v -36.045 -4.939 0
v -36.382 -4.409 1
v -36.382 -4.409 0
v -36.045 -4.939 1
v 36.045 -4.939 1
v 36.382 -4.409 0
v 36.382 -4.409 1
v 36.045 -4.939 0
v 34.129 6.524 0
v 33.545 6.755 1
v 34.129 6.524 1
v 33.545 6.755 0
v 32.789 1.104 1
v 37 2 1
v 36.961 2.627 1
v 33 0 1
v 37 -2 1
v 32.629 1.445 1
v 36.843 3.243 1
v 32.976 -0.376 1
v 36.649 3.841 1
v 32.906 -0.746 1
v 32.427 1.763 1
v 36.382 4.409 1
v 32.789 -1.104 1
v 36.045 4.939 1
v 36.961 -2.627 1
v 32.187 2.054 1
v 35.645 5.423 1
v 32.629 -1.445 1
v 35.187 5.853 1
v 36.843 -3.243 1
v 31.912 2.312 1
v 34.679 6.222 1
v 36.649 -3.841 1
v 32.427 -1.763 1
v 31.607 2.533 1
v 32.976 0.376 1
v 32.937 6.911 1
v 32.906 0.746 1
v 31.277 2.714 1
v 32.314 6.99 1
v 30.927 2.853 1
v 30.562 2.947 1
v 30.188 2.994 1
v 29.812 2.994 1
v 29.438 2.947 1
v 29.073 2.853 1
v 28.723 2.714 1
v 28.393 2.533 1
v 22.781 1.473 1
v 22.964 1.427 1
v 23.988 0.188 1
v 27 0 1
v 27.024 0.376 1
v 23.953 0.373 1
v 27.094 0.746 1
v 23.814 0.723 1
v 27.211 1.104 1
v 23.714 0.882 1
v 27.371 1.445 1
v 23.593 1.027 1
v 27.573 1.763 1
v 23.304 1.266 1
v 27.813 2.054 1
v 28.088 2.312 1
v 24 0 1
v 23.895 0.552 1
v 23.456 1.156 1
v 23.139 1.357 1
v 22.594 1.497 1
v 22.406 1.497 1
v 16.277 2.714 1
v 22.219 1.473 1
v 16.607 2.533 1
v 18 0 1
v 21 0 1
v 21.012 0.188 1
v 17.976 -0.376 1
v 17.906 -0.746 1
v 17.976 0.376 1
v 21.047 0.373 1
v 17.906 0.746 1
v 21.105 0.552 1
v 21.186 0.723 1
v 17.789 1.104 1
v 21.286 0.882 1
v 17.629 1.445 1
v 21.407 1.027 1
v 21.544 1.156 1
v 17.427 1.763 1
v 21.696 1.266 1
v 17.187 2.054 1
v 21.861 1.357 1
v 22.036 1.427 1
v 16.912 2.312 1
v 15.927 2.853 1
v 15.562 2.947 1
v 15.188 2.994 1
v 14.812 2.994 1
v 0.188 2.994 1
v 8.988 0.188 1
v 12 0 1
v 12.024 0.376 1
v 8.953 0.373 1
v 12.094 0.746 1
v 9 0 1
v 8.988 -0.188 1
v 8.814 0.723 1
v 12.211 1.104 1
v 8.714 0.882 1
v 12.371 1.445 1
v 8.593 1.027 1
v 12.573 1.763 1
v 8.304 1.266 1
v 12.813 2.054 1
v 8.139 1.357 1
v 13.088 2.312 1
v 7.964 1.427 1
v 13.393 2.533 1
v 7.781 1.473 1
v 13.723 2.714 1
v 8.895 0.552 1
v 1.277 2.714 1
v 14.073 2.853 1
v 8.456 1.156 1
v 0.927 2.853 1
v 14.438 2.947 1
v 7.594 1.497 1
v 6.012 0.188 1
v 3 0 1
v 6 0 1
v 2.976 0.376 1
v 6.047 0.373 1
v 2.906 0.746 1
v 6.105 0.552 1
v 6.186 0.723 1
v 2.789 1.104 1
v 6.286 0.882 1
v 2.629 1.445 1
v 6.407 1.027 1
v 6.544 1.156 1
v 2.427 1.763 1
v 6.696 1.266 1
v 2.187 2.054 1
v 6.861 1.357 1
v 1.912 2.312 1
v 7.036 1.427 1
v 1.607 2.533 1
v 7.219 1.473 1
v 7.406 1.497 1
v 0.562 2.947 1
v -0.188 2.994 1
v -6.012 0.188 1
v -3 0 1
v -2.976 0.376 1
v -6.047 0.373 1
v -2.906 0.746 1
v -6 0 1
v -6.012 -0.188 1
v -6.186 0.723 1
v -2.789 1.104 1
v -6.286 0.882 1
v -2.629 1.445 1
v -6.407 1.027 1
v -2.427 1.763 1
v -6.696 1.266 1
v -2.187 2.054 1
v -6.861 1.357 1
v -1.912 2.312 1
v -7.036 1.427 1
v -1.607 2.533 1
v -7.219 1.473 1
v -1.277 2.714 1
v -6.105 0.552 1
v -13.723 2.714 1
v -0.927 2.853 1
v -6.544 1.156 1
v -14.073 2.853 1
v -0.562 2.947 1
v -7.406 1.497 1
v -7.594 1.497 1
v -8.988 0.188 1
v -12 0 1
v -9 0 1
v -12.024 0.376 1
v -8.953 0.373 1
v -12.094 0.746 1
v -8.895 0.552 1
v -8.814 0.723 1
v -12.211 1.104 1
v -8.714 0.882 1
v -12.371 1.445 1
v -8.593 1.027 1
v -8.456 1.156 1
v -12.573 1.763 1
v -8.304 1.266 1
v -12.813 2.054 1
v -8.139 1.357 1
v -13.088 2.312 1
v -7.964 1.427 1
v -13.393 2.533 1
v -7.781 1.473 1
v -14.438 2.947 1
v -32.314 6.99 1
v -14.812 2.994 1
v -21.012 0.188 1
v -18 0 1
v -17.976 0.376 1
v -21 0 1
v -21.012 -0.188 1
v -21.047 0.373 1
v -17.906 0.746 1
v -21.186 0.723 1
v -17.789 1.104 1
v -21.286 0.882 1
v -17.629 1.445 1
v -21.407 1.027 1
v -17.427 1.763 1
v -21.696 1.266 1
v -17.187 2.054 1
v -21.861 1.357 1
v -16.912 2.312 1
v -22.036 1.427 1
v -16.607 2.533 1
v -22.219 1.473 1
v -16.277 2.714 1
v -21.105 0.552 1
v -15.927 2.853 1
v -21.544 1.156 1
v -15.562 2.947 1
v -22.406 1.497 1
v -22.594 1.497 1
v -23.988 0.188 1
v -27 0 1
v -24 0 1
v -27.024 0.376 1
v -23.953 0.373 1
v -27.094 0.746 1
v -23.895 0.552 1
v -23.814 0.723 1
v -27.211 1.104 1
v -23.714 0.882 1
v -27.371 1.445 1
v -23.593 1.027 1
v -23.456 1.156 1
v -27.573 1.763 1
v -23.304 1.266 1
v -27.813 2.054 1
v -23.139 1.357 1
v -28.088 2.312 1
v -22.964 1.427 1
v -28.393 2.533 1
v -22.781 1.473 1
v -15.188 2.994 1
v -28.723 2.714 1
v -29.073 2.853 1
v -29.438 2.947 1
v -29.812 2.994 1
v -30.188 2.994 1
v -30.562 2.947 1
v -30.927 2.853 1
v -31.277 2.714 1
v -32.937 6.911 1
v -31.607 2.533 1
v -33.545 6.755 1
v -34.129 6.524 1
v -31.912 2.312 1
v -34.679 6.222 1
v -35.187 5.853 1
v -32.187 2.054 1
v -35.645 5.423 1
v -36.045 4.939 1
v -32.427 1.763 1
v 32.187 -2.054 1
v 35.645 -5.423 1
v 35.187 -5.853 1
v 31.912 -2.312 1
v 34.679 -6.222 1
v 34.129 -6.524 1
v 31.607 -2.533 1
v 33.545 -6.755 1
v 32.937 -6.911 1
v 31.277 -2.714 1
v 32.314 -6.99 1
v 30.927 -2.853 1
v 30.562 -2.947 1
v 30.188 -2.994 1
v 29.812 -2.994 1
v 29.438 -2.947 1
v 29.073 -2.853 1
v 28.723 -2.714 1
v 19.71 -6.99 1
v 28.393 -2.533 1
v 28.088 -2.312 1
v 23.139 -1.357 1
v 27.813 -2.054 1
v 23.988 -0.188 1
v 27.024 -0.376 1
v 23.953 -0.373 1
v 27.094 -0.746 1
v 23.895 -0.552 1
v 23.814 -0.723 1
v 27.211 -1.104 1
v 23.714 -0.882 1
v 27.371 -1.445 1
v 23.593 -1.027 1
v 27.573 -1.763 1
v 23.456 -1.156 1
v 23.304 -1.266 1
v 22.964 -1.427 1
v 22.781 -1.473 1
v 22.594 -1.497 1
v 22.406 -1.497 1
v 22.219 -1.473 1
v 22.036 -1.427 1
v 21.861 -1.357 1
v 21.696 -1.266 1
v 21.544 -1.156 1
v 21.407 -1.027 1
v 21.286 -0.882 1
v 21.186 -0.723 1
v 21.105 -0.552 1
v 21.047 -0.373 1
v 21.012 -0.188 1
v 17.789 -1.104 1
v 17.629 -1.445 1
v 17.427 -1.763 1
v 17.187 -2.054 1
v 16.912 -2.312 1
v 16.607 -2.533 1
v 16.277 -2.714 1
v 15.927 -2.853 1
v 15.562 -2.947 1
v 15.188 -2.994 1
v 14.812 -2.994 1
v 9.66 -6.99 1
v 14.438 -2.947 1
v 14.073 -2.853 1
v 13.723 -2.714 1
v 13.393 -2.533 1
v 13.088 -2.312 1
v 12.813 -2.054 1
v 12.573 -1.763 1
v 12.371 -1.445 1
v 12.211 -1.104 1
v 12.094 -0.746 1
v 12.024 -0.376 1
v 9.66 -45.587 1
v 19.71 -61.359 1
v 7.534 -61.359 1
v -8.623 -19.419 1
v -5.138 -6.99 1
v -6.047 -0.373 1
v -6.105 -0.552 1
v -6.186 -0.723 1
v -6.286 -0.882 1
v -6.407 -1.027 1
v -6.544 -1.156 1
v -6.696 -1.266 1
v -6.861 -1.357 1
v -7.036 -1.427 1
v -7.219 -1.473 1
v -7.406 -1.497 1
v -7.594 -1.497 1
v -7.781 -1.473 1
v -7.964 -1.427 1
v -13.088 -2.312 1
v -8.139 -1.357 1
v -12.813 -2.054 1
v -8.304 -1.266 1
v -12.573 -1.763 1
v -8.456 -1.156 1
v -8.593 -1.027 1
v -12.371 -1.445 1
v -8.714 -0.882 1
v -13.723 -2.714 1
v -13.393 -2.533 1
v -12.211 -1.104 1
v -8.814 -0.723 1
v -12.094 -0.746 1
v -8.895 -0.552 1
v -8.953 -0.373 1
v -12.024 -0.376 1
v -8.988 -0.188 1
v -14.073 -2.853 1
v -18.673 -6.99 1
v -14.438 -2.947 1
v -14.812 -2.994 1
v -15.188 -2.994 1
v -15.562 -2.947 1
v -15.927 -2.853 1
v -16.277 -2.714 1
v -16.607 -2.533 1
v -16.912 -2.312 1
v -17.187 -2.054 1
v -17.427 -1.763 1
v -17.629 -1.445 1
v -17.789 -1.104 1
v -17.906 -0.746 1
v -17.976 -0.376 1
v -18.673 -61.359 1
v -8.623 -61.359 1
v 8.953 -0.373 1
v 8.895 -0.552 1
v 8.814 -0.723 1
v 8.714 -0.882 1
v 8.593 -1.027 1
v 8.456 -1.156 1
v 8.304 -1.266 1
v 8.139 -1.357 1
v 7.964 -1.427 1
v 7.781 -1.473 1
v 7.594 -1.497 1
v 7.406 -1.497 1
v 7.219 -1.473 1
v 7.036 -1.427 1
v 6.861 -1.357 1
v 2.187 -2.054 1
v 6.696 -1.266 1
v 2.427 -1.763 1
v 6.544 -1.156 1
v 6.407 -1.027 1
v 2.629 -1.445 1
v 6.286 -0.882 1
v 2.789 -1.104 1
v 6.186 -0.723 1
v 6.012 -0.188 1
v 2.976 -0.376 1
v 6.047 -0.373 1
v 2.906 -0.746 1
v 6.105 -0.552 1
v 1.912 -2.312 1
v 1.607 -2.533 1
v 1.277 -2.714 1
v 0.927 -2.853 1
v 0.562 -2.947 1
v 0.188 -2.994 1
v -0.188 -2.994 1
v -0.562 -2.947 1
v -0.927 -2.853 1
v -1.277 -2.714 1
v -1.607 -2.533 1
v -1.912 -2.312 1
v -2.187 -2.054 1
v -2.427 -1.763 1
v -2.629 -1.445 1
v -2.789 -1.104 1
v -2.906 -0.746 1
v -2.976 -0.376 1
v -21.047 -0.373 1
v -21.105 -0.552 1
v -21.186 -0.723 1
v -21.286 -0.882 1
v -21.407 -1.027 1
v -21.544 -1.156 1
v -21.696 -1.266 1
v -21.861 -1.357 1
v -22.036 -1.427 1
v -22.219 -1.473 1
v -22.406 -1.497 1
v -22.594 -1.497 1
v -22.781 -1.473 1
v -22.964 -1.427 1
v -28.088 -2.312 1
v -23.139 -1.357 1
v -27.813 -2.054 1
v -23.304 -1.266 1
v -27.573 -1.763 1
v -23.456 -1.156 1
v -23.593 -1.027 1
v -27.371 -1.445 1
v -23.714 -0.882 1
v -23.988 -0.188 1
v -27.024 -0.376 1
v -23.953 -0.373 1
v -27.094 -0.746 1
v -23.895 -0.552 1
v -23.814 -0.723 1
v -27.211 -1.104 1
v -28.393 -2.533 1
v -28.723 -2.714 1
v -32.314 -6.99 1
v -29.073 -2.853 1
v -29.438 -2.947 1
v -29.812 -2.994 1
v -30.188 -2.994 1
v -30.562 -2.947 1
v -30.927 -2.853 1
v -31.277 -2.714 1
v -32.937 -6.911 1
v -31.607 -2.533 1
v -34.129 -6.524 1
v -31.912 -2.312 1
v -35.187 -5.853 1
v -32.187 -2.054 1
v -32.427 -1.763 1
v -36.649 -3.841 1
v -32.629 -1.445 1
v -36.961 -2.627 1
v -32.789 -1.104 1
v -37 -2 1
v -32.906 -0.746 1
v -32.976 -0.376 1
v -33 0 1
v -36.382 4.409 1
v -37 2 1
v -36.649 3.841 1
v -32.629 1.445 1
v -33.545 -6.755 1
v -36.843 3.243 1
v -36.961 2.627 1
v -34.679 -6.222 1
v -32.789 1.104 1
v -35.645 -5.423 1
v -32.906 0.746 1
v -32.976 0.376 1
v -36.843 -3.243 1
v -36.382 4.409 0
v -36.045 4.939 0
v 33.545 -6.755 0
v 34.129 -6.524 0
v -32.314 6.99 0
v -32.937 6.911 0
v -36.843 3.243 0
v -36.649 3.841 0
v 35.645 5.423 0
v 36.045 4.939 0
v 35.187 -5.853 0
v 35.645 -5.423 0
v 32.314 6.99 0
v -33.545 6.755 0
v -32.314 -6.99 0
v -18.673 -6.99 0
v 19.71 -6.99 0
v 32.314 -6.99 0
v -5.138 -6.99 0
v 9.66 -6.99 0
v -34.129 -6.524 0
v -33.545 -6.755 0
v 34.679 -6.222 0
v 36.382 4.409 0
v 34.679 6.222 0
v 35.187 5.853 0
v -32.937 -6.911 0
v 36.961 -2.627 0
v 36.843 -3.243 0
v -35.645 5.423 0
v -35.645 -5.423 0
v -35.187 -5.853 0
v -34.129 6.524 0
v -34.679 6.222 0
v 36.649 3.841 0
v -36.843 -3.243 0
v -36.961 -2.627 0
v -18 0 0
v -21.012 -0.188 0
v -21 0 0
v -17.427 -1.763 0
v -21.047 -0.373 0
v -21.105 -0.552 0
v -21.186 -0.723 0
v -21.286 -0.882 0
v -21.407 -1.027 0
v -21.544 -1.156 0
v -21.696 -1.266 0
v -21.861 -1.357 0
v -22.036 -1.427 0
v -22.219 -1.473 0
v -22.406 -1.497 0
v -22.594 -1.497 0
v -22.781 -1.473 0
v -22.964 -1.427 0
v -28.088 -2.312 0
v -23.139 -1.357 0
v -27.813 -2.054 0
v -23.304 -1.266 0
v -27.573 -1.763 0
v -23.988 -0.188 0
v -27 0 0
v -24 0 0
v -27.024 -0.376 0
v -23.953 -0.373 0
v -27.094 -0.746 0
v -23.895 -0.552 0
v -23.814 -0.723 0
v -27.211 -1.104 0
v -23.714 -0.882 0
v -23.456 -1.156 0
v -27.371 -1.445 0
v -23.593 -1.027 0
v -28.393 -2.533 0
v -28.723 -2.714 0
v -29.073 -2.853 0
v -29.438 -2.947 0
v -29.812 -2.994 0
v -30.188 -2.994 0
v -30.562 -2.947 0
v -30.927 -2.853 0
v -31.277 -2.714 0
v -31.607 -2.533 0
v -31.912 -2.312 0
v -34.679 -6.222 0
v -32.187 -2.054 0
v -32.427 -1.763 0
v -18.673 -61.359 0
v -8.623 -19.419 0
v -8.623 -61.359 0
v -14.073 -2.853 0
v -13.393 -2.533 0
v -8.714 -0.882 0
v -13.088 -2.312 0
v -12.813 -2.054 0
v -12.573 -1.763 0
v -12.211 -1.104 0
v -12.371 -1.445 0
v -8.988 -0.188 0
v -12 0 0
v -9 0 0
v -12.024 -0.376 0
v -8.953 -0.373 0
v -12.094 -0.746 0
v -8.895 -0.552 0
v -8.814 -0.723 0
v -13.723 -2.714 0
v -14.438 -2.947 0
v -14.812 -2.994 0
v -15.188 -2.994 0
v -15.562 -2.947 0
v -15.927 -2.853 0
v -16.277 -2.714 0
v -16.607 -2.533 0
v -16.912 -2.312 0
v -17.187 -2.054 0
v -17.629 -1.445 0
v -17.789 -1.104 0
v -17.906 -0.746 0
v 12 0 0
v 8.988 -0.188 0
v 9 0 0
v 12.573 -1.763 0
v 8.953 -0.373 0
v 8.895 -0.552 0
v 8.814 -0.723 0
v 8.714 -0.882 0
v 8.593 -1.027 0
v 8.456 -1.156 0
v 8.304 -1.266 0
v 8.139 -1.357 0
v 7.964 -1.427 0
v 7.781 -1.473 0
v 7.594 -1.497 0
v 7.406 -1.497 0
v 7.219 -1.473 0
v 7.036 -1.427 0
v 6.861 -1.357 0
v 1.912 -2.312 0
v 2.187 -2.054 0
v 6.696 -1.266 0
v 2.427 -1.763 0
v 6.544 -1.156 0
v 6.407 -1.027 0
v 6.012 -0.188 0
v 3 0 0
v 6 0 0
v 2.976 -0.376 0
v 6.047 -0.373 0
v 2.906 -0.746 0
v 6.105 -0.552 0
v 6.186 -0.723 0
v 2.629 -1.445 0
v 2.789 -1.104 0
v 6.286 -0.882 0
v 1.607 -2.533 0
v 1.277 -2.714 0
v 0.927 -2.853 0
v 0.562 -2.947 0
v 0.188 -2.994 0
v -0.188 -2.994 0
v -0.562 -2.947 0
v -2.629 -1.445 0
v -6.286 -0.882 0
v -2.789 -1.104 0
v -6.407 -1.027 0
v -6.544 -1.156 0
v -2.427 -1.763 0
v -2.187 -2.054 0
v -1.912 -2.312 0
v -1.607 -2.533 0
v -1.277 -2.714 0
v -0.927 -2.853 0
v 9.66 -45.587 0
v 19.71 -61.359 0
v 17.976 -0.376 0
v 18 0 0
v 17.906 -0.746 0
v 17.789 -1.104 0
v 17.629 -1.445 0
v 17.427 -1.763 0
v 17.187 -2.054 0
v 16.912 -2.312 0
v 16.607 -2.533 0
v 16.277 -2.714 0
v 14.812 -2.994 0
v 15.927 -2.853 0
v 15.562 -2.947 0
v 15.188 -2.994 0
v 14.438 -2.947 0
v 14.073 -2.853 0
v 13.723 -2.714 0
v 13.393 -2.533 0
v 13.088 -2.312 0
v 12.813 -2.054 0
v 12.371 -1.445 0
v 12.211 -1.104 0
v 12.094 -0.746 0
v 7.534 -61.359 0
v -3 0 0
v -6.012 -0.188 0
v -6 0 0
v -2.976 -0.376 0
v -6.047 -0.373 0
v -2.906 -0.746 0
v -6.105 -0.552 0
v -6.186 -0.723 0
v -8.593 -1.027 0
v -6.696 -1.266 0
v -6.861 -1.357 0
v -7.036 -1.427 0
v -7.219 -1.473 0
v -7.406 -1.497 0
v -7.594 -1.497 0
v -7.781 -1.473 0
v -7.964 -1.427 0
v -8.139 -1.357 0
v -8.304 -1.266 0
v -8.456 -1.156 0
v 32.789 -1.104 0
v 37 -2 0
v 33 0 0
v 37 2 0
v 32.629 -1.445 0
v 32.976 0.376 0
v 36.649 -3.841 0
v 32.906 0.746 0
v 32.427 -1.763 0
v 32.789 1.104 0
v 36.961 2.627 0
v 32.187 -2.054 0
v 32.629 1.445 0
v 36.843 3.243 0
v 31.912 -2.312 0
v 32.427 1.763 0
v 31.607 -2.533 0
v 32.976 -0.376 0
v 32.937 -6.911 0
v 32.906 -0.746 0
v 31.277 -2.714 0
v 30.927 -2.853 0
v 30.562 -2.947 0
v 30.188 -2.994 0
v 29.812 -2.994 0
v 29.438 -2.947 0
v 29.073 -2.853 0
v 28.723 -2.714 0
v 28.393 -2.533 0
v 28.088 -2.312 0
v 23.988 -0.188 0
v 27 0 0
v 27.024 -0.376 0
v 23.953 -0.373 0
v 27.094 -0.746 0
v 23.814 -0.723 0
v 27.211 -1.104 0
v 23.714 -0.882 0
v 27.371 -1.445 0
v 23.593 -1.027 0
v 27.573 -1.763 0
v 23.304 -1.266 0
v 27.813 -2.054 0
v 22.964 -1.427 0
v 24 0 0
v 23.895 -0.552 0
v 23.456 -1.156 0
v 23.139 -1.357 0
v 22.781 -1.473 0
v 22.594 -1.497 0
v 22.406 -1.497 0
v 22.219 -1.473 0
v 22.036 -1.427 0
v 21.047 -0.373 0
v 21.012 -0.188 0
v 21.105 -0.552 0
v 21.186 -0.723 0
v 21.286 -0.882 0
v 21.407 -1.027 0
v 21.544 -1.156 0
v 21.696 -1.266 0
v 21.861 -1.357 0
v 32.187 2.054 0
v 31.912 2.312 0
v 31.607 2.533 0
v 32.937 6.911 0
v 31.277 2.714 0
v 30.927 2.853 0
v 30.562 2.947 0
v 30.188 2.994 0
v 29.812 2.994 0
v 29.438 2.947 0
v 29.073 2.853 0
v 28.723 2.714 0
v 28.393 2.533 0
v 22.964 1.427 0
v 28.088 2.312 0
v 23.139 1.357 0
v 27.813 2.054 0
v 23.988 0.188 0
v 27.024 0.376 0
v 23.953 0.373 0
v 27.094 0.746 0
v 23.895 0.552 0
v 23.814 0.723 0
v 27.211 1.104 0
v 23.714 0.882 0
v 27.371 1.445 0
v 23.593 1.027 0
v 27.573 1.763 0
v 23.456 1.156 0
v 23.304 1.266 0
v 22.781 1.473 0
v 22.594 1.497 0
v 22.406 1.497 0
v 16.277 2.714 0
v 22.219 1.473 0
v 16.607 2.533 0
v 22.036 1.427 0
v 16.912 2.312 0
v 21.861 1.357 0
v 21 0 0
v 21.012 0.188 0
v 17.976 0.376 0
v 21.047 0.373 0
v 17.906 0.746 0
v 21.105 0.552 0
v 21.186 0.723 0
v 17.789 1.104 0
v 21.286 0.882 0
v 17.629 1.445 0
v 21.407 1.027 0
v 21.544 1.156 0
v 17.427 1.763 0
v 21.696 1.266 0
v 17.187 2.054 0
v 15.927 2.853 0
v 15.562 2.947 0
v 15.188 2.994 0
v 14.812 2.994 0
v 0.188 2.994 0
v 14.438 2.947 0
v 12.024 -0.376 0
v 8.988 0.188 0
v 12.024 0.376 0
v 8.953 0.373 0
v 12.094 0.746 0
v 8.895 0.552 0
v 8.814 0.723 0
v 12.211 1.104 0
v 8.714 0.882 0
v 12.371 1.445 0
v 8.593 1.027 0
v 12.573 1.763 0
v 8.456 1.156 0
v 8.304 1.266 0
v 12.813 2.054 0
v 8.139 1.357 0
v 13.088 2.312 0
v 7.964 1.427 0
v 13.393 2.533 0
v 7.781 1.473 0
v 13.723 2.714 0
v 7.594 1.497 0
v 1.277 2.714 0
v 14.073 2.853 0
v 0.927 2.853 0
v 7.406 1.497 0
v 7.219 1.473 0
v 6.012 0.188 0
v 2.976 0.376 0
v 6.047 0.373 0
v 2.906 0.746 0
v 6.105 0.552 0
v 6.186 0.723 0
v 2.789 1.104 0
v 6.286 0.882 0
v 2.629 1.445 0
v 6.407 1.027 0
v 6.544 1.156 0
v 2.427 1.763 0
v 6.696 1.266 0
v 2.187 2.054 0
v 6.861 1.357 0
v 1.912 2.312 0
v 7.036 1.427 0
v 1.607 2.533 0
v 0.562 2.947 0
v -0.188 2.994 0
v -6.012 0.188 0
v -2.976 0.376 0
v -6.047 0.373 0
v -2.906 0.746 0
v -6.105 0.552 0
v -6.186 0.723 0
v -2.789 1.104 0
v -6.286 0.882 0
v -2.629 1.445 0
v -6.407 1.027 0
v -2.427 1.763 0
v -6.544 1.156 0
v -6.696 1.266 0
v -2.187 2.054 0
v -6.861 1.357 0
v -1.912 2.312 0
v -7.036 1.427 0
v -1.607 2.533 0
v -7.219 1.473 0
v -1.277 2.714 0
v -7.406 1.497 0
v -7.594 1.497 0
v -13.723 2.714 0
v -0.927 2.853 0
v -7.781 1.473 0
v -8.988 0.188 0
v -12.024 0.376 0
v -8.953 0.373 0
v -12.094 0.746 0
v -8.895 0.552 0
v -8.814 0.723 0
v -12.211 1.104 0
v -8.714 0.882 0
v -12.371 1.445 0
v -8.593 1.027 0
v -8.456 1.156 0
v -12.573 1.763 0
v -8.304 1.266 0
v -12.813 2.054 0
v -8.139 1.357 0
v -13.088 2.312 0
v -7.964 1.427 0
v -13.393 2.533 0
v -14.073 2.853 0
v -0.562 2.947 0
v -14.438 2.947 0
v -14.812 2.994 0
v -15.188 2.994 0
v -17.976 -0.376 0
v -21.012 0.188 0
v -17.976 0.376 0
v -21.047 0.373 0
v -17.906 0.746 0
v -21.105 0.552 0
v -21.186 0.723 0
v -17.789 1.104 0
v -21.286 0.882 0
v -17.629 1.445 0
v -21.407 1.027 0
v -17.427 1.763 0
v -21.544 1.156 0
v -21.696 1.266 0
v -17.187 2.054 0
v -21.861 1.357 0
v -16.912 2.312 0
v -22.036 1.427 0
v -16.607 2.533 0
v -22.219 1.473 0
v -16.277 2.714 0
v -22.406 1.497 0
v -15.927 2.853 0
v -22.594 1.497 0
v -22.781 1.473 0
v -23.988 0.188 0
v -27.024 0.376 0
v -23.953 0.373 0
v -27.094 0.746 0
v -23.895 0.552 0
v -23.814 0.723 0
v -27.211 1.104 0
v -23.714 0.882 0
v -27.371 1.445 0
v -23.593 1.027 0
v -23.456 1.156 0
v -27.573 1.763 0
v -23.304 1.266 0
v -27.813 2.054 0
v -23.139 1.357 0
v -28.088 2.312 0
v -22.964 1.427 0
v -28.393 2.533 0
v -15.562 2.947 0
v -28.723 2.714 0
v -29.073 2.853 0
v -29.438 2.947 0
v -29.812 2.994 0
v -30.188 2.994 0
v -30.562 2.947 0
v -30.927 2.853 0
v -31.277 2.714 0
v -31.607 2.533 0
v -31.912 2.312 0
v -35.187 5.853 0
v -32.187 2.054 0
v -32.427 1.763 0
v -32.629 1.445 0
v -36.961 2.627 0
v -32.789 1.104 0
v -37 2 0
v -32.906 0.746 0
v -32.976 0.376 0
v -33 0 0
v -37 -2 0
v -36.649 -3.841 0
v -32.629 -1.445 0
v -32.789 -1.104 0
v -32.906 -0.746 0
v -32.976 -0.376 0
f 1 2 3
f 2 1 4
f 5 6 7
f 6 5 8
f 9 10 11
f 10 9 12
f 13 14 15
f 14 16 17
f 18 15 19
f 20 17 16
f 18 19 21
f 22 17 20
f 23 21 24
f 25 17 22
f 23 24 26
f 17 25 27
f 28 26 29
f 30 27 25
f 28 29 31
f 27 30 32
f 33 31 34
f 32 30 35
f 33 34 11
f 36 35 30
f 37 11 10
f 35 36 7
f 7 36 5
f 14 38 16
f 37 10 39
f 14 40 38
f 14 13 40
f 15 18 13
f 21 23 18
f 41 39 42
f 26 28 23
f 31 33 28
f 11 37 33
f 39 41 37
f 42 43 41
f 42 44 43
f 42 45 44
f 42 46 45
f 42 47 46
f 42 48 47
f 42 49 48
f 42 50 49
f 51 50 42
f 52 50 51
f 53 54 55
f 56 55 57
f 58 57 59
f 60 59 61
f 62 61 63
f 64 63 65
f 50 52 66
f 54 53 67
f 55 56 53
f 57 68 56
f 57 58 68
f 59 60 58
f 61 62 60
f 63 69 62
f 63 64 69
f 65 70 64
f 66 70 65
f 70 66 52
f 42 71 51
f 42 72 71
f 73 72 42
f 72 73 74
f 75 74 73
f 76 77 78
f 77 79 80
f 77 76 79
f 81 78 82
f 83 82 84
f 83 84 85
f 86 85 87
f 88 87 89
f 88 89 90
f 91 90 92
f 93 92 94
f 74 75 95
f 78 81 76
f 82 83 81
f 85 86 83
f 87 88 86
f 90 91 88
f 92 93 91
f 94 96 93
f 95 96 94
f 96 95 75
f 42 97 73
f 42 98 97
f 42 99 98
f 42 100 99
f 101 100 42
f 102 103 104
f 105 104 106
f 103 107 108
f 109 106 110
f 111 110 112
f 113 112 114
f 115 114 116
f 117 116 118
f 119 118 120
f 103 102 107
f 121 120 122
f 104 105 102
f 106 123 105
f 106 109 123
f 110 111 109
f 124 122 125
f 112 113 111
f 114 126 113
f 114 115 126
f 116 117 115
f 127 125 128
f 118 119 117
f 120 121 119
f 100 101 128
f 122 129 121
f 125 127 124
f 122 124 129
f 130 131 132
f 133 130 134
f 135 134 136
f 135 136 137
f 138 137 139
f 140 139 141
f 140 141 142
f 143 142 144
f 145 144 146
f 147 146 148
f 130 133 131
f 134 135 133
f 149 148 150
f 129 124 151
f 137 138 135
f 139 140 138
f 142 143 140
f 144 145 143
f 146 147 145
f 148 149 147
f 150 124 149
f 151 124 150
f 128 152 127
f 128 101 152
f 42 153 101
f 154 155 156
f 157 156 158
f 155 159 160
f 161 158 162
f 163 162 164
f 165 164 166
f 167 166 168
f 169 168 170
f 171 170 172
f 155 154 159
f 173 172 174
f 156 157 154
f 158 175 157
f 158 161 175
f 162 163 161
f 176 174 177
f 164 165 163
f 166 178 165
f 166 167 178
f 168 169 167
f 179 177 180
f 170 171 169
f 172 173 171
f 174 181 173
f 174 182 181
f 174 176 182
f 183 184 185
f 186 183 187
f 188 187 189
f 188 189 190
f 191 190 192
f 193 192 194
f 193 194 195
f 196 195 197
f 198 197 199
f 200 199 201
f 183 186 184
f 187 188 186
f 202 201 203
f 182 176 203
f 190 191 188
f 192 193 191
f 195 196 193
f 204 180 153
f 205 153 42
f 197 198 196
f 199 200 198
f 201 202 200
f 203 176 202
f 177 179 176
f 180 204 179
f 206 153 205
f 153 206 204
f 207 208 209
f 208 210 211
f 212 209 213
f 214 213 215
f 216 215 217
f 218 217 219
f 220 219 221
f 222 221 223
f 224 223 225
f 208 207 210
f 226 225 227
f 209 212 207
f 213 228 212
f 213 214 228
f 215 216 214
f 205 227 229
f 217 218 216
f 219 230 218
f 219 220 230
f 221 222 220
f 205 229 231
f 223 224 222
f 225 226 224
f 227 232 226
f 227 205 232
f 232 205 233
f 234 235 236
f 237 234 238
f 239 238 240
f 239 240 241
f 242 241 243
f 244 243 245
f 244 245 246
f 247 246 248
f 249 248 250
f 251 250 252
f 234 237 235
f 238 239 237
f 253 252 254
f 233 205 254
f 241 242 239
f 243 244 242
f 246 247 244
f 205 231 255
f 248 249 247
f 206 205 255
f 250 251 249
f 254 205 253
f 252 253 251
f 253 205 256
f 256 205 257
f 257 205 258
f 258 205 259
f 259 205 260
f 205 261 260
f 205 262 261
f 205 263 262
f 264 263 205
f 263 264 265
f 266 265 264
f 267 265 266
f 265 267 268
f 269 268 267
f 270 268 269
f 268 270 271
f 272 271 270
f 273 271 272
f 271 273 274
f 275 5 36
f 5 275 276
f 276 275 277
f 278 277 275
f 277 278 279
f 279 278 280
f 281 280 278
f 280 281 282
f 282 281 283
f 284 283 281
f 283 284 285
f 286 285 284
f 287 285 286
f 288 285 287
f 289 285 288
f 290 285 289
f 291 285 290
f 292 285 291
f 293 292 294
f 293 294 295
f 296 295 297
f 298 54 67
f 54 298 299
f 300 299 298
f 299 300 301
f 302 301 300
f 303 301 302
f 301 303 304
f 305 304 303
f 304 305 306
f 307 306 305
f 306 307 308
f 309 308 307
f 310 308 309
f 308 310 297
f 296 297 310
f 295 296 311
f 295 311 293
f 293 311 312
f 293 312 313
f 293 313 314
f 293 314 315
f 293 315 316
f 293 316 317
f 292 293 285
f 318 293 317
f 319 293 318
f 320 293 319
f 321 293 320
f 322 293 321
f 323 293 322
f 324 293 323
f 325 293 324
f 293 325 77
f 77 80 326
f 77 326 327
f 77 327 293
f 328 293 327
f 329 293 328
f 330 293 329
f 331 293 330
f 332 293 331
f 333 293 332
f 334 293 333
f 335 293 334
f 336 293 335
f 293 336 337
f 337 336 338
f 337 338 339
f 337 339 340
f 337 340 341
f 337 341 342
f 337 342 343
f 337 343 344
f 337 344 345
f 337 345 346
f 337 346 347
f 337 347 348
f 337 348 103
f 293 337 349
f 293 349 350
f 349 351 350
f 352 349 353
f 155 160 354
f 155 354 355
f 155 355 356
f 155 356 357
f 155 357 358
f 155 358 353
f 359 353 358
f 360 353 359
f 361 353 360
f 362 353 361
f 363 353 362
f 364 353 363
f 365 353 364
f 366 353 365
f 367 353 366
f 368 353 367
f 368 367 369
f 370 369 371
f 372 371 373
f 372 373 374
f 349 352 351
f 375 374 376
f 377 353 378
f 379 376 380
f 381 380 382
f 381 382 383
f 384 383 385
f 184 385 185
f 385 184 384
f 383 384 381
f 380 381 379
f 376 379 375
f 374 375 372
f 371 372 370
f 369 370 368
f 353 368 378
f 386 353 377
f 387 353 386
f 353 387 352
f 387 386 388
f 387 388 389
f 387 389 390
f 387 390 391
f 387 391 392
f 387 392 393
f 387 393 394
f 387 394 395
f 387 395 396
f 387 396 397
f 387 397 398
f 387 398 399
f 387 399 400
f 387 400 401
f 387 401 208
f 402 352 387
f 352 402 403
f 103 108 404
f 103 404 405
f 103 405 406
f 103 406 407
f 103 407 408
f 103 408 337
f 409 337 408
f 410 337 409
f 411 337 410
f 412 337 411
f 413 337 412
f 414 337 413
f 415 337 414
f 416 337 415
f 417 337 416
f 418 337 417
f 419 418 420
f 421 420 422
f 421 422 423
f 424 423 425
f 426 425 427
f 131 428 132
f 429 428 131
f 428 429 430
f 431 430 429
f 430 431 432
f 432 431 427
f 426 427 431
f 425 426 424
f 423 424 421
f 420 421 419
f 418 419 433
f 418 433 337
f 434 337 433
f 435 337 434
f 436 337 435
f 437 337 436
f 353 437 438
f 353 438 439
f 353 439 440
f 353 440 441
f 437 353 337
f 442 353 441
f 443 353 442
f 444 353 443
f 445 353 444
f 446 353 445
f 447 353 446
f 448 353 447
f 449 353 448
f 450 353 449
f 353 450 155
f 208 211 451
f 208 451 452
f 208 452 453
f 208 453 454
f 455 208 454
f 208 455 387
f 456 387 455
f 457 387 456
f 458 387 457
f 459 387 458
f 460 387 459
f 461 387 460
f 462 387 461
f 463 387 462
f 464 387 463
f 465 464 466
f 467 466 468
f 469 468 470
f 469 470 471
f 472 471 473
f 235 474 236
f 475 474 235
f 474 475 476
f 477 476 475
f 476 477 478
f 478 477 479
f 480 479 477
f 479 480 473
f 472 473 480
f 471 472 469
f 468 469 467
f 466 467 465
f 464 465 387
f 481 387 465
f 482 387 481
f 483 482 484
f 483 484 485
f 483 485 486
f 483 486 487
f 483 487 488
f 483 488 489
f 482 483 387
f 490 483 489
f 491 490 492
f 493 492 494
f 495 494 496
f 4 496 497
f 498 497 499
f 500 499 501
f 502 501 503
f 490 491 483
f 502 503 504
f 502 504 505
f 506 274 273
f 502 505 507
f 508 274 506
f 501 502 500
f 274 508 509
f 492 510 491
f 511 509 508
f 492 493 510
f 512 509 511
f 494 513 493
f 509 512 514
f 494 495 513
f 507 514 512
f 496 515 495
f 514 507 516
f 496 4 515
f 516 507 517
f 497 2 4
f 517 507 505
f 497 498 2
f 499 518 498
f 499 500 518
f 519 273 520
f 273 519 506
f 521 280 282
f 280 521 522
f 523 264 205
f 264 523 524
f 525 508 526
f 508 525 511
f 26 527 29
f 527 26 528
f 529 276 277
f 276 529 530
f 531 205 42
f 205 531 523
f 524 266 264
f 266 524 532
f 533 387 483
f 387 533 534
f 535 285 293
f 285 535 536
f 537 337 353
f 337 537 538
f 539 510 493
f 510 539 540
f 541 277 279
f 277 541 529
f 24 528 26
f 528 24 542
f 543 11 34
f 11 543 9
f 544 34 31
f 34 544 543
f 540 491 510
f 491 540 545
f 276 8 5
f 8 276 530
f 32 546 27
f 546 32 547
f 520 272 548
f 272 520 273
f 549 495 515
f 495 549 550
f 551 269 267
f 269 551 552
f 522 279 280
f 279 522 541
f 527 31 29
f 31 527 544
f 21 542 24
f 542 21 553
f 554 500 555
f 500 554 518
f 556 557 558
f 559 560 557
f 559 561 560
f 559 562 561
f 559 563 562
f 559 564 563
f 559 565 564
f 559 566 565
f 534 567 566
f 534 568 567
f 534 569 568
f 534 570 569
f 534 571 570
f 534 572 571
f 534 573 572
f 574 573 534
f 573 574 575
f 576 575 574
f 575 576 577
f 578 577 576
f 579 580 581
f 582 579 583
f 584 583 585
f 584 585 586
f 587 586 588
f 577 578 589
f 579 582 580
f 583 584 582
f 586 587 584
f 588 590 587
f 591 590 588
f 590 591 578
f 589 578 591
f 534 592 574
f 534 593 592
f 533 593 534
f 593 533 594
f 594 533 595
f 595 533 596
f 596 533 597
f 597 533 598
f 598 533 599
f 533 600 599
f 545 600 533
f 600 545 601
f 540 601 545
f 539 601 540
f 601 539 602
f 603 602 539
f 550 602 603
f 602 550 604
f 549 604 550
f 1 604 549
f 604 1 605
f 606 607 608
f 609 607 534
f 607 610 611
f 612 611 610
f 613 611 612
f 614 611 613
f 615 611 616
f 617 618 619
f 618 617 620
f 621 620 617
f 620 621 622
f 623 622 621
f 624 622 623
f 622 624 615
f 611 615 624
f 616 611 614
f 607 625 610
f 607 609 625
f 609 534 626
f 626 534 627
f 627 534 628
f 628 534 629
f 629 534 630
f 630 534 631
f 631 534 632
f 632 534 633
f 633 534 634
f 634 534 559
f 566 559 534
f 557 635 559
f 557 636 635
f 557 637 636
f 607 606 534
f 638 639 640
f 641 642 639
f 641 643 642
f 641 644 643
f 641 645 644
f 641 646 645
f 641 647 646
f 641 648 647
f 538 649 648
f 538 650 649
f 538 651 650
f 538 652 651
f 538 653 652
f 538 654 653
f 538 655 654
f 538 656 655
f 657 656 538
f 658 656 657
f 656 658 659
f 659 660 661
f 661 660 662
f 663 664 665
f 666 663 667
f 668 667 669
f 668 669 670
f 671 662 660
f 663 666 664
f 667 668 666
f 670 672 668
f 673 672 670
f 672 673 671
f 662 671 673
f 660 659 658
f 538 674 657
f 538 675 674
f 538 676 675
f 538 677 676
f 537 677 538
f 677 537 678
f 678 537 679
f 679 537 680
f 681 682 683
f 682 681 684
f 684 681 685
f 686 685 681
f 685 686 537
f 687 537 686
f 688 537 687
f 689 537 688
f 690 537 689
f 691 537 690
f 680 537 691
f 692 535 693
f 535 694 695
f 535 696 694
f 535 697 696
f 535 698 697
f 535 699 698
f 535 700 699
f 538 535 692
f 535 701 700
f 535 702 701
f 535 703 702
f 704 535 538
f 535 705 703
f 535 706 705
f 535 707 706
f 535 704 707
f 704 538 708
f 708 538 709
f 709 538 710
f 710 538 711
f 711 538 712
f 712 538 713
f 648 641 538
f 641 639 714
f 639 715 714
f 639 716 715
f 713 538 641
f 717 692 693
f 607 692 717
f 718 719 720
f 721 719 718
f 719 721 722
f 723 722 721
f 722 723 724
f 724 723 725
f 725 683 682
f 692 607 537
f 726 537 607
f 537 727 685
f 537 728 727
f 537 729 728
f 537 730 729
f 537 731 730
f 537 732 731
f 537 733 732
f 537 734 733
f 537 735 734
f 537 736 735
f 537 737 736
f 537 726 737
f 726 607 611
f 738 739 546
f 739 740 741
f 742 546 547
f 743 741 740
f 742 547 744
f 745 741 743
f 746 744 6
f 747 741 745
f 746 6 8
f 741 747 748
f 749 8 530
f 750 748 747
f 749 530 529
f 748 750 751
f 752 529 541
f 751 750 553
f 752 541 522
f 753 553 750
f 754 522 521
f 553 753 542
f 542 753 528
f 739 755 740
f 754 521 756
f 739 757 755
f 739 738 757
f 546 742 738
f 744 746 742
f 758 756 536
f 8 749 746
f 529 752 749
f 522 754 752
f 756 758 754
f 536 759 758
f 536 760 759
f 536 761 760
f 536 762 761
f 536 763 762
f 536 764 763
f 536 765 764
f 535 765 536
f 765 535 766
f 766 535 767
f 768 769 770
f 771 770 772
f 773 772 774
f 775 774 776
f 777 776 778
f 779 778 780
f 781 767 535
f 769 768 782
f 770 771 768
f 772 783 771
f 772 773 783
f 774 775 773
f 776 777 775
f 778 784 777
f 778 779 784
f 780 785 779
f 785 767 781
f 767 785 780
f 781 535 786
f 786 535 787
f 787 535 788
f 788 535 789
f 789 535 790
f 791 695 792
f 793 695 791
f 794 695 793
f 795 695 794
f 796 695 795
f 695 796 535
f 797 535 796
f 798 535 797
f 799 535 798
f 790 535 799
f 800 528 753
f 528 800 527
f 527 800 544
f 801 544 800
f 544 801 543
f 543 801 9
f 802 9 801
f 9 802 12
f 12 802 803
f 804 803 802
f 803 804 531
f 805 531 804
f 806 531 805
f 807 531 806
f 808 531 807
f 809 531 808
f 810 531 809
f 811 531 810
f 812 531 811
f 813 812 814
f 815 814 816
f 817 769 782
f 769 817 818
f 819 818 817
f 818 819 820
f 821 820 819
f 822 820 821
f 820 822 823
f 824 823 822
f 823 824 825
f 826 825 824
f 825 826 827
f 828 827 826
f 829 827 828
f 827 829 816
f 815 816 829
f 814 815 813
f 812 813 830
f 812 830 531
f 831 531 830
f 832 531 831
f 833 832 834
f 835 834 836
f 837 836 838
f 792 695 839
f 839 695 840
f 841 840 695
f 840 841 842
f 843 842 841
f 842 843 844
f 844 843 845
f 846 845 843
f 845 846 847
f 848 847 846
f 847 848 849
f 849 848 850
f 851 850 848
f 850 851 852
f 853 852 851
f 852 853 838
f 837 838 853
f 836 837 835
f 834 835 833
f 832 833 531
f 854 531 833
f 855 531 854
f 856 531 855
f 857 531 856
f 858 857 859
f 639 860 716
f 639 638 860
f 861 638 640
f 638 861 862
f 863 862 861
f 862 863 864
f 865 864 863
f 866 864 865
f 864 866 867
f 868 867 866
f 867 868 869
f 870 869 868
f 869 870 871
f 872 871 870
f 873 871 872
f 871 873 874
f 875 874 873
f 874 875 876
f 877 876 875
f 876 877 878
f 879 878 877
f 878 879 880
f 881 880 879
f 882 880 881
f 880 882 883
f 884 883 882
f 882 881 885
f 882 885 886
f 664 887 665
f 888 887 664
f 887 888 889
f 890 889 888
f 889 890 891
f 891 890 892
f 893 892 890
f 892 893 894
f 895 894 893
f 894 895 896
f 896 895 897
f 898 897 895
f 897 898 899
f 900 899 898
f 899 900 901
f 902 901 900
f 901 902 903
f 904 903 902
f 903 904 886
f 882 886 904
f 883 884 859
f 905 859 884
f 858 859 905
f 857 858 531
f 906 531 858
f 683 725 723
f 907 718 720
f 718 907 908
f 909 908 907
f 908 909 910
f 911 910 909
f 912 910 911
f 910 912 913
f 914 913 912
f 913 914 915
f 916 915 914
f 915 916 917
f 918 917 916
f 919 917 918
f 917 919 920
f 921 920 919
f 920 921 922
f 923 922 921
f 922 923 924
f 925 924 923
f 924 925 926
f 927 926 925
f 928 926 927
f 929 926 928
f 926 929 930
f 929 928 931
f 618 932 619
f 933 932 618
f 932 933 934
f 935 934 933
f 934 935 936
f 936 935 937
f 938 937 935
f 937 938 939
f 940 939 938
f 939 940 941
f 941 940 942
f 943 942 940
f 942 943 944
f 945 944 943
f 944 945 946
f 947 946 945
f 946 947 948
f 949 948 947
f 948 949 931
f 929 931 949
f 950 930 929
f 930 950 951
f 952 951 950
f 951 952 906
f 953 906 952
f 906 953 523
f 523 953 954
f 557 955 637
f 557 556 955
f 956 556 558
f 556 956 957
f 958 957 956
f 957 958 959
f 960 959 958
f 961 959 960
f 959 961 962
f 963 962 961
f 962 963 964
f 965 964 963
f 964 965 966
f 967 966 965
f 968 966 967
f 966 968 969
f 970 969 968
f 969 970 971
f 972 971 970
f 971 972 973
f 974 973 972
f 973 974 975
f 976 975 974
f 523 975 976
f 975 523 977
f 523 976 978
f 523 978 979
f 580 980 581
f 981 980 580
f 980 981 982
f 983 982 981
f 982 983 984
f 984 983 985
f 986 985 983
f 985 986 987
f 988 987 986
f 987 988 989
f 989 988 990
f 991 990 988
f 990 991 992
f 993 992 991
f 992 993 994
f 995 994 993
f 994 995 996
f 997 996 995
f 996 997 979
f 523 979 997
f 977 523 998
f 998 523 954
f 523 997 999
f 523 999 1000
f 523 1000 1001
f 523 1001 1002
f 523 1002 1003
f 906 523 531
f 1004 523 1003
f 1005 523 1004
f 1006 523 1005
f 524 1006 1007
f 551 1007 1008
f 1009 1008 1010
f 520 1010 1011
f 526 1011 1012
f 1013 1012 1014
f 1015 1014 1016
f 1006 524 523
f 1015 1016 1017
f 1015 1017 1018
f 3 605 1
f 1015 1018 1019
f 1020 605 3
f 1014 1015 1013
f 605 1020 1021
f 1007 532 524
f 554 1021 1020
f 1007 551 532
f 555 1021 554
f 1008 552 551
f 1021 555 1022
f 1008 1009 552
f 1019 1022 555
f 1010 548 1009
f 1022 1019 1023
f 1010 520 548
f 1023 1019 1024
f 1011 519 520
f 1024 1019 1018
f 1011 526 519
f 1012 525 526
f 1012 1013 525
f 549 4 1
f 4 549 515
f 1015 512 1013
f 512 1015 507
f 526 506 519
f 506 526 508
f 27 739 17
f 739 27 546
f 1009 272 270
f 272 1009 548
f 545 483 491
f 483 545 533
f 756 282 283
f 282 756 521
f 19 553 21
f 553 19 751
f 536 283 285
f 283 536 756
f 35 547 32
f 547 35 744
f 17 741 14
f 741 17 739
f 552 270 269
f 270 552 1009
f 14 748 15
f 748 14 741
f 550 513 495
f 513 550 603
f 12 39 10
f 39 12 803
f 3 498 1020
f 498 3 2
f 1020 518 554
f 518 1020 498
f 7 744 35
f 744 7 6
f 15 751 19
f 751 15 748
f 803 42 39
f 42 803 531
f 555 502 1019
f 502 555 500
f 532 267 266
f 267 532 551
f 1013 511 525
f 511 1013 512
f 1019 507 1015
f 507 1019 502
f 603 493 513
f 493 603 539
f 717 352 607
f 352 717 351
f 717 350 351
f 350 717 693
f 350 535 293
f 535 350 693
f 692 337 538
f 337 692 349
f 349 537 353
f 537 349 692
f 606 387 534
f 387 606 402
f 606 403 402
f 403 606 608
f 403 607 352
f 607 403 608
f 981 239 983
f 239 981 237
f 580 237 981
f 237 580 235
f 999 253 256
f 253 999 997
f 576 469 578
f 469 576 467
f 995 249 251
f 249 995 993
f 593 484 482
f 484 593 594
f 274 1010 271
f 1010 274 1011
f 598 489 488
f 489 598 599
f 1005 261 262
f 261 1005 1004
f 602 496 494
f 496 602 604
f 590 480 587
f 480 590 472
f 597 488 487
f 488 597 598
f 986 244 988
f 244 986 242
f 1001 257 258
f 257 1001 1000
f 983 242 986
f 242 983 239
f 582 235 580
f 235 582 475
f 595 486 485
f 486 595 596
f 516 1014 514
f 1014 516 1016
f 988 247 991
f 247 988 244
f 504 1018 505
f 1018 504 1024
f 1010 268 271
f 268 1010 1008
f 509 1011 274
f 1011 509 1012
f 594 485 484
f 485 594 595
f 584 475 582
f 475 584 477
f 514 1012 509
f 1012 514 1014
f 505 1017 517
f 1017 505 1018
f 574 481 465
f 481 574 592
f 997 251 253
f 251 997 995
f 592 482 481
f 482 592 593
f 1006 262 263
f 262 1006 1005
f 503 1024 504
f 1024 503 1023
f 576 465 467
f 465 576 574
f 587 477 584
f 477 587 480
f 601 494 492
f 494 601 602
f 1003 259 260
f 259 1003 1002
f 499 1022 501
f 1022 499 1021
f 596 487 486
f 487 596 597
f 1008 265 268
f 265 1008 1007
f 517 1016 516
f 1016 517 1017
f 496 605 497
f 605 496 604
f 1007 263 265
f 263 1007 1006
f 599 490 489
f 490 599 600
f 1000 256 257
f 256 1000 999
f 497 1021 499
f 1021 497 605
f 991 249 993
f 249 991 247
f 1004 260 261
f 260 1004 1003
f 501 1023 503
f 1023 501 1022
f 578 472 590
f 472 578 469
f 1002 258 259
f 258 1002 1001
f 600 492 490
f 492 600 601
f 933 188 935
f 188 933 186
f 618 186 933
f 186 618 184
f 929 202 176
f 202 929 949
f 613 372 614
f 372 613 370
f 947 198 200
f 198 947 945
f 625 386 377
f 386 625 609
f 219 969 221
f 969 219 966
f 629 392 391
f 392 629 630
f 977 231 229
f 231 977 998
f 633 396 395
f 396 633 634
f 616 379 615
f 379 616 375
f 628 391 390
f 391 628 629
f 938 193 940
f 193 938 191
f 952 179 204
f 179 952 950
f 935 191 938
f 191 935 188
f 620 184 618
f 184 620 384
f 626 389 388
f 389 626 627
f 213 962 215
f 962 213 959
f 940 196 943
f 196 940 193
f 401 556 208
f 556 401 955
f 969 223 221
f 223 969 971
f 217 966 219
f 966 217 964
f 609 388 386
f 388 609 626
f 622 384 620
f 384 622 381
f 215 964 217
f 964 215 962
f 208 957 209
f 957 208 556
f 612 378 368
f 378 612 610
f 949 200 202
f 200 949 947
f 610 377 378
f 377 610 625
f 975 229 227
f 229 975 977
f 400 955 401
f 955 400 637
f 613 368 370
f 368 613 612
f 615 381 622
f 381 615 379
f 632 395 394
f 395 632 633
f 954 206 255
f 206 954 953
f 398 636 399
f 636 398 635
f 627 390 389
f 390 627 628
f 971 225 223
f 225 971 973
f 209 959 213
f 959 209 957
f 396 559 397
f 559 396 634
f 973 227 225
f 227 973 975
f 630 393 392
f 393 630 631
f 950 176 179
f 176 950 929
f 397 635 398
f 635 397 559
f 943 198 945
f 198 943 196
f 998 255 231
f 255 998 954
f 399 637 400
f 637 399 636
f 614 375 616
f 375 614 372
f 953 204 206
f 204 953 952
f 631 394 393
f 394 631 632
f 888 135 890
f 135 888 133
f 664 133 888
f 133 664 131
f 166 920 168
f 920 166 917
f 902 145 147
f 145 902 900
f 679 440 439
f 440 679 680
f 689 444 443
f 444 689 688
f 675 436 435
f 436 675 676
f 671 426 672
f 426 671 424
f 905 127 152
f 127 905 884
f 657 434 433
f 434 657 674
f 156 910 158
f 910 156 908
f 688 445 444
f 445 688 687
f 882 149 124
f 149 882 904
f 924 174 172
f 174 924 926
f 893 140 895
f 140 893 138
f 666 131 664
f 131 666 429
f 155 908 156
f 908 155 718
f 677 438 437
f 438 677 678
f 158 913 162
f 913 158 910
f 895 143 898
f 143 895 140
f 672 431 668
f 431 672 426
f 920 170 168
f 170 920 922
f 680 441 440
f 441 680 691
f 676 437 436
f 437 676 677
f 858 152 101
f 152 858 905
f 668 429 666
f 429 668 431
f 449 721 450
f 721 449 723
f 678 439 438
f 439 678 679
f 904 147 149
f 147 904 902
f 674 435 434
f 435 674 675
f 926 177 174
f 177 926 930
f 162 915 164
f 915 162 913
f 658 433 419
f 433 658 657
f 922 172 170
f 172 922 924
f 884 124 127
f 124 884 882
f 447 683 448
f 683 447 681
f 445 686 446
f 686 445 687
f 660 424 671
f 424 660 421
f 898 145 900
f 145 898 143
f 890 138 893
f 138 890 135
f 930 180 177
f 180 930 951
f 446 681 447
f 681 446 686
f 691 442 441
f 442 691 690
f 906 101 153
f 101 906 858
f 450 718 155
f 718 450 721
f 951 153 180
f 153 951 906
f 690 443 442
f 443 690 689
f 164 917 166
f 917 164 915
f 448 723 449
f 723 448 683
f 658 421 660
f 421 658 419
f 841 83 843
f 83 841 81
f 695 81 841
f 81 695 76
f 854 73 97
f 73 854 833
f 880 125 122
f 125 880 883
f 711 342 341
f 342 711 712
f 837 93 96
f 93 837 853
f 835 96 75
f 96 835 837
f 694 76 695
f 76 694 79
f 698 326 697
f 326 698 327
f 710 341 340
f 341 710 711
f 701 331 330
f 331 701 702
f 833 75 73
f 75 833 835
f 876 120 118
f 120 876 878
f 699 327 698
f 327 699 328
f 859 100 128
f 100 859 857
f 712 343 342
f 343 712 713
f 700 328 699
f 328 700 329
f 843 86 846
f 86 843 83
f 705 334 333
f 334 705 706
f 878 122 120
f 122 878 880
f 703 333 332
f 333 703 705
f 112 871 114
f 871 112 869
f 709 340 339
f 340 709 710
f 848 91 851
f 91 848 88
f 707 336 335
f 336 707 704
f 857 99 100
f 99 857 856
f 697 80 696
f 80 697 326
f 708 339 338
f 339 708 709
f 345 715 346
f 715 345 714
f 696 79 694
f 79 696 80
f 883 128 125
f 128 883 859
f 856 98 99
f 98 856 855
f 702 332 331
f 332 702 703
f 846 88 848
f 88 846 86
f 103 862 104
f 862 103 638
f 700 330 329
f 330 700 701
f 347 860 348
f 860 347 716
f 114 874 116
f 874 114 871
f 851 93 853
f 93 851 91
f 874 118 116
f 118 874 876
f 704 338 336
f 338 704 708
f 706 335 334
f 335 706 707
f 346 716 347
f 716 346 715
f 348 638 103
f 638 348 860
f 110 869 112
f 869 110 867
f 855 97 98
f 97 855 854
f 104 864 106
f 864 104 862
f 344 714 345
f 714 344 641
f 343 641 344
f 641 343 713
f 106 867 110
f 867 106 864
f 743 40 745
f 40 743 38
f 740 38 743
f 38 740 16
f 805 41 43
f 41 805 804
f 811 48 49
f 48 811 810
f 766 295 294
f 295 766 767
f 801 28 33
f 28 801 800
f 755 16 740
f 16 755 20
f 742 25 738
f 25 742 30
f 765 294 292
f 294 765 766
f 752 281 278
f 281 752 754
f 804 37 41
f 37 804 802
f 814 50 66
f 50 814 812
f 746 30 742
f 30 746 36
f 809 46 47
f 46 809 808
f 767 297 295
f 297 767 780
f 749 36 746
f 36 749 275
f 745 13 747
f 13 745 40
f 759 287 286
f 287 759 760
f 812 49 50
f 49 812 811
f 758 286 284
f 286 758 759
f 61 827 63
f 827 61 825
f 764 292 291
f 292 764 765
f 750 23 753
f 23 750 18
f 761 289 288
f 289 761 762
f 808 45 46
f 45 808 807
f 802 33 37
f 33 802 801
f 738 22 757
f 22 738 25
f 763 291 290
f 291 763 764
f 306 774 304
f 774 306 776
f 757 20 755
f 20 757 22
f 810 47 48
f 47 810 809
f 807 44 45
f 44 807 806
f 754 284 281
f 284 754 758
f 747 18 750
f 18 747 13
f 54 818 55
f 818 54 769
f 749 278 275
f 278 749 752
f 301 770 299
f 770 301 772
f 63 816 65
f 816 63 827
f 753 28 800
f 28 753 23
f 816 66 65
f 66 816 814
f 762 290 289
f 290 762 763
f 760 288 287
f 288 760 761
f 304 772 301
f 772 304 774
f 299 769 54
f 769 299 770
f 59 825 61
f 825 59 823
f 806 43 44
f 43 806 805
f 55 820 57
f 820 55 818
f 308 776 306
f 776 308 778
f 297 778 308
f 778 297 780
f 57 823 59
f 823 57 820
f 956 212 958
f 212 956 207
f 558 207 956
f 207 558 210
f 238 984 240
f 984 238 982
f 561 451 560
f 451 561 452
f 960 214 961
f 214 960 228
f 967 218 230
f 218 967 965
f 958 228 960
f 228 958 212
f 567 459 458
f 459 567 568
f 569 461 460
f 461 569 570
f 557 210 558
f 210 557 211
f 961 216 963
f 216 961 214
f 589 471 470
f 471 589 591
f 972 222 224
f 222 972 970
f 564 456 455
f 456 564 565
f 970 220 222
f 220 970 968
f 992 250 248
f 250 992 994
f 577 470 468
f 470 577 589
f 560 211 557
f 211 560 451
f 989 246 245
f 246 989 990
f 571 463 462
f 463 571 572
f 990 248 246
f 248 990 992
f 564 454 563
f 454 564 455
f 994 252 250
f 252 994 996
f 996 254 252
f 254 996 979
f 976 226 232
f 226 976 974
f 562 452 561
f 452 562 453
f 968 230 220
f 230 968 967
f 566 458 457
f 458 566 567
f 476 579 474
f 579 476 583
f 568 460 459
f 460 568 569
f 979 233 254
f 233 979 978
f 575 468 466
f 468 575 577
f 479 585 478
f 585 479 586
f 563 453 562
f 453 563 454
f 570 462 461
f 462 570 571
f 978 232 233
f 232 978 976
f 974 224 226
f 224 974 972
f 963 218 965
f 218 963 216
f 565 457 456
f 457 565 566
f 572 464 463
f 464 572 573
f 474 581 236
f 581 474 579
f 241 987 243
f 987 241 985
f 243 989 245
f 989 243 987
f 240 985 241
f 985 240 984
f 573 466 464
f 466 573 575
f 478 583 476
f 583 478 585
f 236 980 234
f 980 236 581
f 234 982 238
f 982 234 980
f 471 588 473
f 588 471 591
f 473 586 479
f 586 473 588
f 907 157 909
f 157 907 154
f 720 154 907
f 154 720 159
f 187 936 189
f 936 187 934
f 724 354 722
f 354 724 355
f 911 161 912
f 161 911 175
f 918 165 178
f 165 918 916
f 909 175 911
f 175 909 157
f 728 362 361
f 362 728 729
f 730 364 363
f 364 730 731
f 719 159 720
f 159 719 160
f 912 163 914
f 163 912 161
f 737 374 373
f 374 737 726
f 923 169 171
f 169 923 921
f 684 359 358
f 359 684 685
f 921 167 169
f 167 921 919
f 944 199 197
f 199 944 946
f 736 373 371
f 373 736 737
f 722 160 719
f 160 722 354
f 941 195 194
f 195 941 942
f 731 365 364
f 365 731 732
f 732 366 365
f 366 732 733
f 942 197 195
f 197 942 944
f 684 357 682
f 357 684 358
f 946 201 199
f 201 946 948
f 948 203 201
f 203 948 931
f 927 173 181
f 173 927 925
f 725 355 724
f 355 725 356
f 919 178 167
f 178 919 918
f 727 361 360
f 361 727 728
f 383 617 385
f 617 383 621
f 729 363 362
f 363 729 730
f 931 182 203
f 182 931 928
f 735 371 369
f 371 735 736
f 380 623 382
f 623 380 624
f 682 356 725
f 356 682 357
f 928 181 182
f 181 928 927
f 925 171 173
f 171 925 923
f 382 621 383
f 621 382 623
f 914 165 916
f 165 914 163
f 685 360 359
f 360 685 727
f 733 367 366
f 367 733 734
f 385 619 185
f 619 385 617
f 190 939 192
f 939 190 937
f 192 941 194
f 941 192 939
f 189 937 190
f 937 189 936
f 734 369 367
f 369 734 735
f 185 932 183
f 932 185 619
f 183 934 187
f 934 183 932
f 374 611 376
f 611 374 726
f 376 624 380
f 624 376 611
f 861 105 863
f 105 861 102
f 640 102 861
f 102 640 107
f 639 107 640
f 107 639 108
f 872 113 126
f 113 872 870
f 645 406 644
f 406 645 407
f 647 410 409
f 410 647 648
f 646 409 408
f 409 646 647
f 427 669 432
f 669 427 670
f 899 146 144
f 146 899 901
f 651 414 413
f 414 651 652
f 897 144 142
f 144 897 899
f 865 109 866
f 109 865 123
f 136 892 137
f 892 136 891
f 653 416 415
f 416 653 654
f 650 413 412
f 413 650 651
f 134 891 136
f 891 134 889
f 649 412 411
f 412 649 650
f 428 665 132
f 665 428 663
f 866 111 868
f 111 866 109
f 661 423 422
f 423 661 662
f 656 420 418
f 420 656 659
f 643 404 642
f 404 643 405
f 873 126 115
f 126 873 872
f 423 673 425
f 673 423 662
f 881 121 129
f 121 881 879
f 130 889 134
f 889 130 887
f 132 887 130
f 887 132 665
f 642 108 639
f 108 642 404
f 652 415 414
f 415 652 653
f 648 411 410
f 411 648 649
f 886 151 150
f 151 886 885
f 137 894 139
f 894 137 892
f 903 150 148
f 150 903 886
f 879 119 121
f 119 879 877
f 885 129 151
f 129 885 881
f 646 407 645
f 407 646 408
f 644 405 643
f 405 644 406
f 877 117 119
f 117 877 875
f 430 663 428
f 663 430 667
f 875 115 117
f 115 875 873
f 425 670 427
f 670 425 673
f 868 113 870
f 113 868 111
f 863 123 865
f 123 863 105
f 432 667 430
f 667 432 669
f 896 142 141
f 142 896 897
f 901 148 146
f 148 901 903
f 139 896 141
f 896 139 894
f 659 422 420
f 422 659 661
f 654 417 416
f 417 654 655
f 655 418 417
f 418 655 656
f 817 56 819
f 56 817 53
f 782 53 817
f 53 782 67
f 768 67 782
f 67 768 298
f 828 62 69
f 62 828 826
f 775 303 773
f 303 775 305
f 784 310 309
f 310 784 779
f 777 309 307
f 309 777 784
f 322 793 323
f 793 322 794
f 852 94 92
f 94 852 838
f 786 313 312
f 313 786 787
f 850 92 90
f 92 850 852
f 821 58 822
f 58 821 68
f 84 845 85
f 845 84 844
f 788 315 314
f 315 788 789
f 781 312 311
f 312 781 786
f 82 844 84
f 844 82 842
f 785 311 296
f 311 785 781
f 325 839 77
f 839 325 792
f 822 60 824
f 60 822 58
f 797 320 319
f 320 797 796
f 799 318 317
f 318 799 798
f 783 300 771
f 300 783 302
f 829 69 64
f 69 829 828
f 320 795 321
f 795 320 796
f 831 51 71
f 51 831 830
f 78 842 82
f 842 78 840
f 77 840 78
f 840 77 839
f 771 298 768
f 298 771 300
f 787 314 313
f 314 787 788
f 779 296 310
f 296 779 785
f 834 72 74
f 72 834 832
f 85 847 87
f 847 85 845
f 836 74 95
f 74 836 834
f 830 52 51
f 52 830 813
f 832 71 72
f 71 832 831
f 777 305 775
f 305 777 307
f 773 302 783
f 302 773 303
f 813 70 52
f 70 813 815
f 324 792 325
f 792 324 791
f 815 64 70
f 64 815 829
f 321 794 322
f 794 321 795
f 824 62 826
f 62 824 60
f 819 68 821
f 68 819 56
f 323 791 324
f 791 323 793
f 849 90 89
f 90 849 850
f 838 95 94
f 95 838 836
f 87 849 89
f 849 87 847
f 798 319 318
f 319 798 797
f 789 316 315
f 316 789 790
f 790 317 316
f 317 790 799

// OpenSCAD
$fn = 50;


difference() {
	union() {
		*color(alpha = 1.0000000000, c = "gray") {
			translate(v = [0, 14, 0]) {
				linear_extrude(height = 1) {
					text(font = "Arial:style=Bold", halign = "center", size = 4.5000000000, text = "COMMENT description oobb_plate_shape_p_type_1_depth_5_width_1_thickness_n_extra_oobb_size", valign = "center");
				}
			}
		}
		hull() {
			translate(v = [-32.0000000000, 2.0000000000, 0]) {
				cylinder(h = 1, r = 5);
			}
			translate(v = [32.0000000000, 2.0000000000, 0]) {
				cylinder(h = 1, r = 5);
			}
			translate(v = [-32.0000000000, -2.0000000000, 0]) {
				cylinder(h = 1, r = 5);
			}
			translate(v = [32.0000000000, -2.0000000000, 0]) {
				cylinder(h = 1, r = 5);
			}
		}
		translate(v = [0, -5, 0]) {
			linear_extrude(height = 1) {
				text(font = "DejaVu Sans Mono:style=Bold", halign = "center", size = 57.0000000000, text = "N", valign = "top");
			}
		}
	}
	union() {
		*color(alpha = 1.0000000000, c = "gray") {
			translate(v = [0, 14, 0]) {
				linear_extrude(height = 1) {
					text(font = "Arial:style=Bold", halign = "center", size = 4.5000000000, text = "COMMENT description oobb_holes_shape_n_type_5_width_1_thickness_n_extra_oobb_size_1_height_'all'_holes_true_both_holes", valign = "center");
				}
			}
		}
		translate(v = [-30.0000000000, 0.0000000000, 0]) {
			translate(v = [0, 0, -50]) {
				cylinder(h = 100, r = 3.0000000000);
			}
		}
		translate(v = [-15.0000000000, 0.0000000000, 0]) {
			translate(v = [0, 0, -50]) {
				cylinder(h = 100, r = 3.0000000000);
			}
		}
		translate(v = [0, 0, -50]) {
			cylinder(h = 100, r = 3.0000000000);
		}
		translate(v = [15.0000000000, 0.0000000000, 0]) {
			translate(v = [0, 0, -50]) {
				cylinder(h = 100, r = 3.0000000000);
			}
		}
		translate(v = [30.0000000000, 0.0000000000, 0]) {
			translate(v = [0, 0, -50]) {
				cylinder(h = 100, r = 3.0000000000);
			}
		}
		translate(v = [-30.0000000000, 0.0000000000, 0]) {
			translate(v = [0, 0, -50]) {
				cylinder(h = 100, r = 1.5000000000);
			}
		}
		translate(v = [-22.5000000000, 0.0000000000, 0]) {
			translate(v = [0, 0, -50]) {
				cylinder(h = 100, r = 1.5000000000);
			}
		}
		translate(v = [-15.0000000000, 0.0000000000, 0]) {
			translate(v = [0, 0, -50]) {
				cylinder(h = 100, r = 1.5000000000);
			}
		}
		translate(v = [-7.5000000000, 0.0000000000, 0]) {
			translate(v = [0, 0, -50]) {
				cylinder(h = 100, r = 1.5000000000);
			}
		}
		translate(v = [0, 0, -50]) {
			cylinder(h = 100, r = 1.5000000000);
		}
		translate(v = [7.5000000000, 0.0000000000, 0]) {
			translate(v = [0, 0, -50]) {
				cylinder(h = 100, r = 1.5000000000);
			}
		}
		translate(v = [15.0000000000, 0.0000000000, 0]) {
			translate(v = [0, 0, -50]) {
				cylinder(h = 100, r = 1.5000000000);
			}
		}
		translate(v = [22.5000000000, 0.0000000000, 0]) {
			translate(v = [0, 0, -50]) {
				cylinder(h = 100, r = 1.5000000000);
			}
		}
		translate(v = [30.0000000000, 0.0000000000, 0]) {
			translate(v = [0, 0, -50]) {
				cylinder(h = 100, r = 1.5000000000);
			}
		}
	}
}
